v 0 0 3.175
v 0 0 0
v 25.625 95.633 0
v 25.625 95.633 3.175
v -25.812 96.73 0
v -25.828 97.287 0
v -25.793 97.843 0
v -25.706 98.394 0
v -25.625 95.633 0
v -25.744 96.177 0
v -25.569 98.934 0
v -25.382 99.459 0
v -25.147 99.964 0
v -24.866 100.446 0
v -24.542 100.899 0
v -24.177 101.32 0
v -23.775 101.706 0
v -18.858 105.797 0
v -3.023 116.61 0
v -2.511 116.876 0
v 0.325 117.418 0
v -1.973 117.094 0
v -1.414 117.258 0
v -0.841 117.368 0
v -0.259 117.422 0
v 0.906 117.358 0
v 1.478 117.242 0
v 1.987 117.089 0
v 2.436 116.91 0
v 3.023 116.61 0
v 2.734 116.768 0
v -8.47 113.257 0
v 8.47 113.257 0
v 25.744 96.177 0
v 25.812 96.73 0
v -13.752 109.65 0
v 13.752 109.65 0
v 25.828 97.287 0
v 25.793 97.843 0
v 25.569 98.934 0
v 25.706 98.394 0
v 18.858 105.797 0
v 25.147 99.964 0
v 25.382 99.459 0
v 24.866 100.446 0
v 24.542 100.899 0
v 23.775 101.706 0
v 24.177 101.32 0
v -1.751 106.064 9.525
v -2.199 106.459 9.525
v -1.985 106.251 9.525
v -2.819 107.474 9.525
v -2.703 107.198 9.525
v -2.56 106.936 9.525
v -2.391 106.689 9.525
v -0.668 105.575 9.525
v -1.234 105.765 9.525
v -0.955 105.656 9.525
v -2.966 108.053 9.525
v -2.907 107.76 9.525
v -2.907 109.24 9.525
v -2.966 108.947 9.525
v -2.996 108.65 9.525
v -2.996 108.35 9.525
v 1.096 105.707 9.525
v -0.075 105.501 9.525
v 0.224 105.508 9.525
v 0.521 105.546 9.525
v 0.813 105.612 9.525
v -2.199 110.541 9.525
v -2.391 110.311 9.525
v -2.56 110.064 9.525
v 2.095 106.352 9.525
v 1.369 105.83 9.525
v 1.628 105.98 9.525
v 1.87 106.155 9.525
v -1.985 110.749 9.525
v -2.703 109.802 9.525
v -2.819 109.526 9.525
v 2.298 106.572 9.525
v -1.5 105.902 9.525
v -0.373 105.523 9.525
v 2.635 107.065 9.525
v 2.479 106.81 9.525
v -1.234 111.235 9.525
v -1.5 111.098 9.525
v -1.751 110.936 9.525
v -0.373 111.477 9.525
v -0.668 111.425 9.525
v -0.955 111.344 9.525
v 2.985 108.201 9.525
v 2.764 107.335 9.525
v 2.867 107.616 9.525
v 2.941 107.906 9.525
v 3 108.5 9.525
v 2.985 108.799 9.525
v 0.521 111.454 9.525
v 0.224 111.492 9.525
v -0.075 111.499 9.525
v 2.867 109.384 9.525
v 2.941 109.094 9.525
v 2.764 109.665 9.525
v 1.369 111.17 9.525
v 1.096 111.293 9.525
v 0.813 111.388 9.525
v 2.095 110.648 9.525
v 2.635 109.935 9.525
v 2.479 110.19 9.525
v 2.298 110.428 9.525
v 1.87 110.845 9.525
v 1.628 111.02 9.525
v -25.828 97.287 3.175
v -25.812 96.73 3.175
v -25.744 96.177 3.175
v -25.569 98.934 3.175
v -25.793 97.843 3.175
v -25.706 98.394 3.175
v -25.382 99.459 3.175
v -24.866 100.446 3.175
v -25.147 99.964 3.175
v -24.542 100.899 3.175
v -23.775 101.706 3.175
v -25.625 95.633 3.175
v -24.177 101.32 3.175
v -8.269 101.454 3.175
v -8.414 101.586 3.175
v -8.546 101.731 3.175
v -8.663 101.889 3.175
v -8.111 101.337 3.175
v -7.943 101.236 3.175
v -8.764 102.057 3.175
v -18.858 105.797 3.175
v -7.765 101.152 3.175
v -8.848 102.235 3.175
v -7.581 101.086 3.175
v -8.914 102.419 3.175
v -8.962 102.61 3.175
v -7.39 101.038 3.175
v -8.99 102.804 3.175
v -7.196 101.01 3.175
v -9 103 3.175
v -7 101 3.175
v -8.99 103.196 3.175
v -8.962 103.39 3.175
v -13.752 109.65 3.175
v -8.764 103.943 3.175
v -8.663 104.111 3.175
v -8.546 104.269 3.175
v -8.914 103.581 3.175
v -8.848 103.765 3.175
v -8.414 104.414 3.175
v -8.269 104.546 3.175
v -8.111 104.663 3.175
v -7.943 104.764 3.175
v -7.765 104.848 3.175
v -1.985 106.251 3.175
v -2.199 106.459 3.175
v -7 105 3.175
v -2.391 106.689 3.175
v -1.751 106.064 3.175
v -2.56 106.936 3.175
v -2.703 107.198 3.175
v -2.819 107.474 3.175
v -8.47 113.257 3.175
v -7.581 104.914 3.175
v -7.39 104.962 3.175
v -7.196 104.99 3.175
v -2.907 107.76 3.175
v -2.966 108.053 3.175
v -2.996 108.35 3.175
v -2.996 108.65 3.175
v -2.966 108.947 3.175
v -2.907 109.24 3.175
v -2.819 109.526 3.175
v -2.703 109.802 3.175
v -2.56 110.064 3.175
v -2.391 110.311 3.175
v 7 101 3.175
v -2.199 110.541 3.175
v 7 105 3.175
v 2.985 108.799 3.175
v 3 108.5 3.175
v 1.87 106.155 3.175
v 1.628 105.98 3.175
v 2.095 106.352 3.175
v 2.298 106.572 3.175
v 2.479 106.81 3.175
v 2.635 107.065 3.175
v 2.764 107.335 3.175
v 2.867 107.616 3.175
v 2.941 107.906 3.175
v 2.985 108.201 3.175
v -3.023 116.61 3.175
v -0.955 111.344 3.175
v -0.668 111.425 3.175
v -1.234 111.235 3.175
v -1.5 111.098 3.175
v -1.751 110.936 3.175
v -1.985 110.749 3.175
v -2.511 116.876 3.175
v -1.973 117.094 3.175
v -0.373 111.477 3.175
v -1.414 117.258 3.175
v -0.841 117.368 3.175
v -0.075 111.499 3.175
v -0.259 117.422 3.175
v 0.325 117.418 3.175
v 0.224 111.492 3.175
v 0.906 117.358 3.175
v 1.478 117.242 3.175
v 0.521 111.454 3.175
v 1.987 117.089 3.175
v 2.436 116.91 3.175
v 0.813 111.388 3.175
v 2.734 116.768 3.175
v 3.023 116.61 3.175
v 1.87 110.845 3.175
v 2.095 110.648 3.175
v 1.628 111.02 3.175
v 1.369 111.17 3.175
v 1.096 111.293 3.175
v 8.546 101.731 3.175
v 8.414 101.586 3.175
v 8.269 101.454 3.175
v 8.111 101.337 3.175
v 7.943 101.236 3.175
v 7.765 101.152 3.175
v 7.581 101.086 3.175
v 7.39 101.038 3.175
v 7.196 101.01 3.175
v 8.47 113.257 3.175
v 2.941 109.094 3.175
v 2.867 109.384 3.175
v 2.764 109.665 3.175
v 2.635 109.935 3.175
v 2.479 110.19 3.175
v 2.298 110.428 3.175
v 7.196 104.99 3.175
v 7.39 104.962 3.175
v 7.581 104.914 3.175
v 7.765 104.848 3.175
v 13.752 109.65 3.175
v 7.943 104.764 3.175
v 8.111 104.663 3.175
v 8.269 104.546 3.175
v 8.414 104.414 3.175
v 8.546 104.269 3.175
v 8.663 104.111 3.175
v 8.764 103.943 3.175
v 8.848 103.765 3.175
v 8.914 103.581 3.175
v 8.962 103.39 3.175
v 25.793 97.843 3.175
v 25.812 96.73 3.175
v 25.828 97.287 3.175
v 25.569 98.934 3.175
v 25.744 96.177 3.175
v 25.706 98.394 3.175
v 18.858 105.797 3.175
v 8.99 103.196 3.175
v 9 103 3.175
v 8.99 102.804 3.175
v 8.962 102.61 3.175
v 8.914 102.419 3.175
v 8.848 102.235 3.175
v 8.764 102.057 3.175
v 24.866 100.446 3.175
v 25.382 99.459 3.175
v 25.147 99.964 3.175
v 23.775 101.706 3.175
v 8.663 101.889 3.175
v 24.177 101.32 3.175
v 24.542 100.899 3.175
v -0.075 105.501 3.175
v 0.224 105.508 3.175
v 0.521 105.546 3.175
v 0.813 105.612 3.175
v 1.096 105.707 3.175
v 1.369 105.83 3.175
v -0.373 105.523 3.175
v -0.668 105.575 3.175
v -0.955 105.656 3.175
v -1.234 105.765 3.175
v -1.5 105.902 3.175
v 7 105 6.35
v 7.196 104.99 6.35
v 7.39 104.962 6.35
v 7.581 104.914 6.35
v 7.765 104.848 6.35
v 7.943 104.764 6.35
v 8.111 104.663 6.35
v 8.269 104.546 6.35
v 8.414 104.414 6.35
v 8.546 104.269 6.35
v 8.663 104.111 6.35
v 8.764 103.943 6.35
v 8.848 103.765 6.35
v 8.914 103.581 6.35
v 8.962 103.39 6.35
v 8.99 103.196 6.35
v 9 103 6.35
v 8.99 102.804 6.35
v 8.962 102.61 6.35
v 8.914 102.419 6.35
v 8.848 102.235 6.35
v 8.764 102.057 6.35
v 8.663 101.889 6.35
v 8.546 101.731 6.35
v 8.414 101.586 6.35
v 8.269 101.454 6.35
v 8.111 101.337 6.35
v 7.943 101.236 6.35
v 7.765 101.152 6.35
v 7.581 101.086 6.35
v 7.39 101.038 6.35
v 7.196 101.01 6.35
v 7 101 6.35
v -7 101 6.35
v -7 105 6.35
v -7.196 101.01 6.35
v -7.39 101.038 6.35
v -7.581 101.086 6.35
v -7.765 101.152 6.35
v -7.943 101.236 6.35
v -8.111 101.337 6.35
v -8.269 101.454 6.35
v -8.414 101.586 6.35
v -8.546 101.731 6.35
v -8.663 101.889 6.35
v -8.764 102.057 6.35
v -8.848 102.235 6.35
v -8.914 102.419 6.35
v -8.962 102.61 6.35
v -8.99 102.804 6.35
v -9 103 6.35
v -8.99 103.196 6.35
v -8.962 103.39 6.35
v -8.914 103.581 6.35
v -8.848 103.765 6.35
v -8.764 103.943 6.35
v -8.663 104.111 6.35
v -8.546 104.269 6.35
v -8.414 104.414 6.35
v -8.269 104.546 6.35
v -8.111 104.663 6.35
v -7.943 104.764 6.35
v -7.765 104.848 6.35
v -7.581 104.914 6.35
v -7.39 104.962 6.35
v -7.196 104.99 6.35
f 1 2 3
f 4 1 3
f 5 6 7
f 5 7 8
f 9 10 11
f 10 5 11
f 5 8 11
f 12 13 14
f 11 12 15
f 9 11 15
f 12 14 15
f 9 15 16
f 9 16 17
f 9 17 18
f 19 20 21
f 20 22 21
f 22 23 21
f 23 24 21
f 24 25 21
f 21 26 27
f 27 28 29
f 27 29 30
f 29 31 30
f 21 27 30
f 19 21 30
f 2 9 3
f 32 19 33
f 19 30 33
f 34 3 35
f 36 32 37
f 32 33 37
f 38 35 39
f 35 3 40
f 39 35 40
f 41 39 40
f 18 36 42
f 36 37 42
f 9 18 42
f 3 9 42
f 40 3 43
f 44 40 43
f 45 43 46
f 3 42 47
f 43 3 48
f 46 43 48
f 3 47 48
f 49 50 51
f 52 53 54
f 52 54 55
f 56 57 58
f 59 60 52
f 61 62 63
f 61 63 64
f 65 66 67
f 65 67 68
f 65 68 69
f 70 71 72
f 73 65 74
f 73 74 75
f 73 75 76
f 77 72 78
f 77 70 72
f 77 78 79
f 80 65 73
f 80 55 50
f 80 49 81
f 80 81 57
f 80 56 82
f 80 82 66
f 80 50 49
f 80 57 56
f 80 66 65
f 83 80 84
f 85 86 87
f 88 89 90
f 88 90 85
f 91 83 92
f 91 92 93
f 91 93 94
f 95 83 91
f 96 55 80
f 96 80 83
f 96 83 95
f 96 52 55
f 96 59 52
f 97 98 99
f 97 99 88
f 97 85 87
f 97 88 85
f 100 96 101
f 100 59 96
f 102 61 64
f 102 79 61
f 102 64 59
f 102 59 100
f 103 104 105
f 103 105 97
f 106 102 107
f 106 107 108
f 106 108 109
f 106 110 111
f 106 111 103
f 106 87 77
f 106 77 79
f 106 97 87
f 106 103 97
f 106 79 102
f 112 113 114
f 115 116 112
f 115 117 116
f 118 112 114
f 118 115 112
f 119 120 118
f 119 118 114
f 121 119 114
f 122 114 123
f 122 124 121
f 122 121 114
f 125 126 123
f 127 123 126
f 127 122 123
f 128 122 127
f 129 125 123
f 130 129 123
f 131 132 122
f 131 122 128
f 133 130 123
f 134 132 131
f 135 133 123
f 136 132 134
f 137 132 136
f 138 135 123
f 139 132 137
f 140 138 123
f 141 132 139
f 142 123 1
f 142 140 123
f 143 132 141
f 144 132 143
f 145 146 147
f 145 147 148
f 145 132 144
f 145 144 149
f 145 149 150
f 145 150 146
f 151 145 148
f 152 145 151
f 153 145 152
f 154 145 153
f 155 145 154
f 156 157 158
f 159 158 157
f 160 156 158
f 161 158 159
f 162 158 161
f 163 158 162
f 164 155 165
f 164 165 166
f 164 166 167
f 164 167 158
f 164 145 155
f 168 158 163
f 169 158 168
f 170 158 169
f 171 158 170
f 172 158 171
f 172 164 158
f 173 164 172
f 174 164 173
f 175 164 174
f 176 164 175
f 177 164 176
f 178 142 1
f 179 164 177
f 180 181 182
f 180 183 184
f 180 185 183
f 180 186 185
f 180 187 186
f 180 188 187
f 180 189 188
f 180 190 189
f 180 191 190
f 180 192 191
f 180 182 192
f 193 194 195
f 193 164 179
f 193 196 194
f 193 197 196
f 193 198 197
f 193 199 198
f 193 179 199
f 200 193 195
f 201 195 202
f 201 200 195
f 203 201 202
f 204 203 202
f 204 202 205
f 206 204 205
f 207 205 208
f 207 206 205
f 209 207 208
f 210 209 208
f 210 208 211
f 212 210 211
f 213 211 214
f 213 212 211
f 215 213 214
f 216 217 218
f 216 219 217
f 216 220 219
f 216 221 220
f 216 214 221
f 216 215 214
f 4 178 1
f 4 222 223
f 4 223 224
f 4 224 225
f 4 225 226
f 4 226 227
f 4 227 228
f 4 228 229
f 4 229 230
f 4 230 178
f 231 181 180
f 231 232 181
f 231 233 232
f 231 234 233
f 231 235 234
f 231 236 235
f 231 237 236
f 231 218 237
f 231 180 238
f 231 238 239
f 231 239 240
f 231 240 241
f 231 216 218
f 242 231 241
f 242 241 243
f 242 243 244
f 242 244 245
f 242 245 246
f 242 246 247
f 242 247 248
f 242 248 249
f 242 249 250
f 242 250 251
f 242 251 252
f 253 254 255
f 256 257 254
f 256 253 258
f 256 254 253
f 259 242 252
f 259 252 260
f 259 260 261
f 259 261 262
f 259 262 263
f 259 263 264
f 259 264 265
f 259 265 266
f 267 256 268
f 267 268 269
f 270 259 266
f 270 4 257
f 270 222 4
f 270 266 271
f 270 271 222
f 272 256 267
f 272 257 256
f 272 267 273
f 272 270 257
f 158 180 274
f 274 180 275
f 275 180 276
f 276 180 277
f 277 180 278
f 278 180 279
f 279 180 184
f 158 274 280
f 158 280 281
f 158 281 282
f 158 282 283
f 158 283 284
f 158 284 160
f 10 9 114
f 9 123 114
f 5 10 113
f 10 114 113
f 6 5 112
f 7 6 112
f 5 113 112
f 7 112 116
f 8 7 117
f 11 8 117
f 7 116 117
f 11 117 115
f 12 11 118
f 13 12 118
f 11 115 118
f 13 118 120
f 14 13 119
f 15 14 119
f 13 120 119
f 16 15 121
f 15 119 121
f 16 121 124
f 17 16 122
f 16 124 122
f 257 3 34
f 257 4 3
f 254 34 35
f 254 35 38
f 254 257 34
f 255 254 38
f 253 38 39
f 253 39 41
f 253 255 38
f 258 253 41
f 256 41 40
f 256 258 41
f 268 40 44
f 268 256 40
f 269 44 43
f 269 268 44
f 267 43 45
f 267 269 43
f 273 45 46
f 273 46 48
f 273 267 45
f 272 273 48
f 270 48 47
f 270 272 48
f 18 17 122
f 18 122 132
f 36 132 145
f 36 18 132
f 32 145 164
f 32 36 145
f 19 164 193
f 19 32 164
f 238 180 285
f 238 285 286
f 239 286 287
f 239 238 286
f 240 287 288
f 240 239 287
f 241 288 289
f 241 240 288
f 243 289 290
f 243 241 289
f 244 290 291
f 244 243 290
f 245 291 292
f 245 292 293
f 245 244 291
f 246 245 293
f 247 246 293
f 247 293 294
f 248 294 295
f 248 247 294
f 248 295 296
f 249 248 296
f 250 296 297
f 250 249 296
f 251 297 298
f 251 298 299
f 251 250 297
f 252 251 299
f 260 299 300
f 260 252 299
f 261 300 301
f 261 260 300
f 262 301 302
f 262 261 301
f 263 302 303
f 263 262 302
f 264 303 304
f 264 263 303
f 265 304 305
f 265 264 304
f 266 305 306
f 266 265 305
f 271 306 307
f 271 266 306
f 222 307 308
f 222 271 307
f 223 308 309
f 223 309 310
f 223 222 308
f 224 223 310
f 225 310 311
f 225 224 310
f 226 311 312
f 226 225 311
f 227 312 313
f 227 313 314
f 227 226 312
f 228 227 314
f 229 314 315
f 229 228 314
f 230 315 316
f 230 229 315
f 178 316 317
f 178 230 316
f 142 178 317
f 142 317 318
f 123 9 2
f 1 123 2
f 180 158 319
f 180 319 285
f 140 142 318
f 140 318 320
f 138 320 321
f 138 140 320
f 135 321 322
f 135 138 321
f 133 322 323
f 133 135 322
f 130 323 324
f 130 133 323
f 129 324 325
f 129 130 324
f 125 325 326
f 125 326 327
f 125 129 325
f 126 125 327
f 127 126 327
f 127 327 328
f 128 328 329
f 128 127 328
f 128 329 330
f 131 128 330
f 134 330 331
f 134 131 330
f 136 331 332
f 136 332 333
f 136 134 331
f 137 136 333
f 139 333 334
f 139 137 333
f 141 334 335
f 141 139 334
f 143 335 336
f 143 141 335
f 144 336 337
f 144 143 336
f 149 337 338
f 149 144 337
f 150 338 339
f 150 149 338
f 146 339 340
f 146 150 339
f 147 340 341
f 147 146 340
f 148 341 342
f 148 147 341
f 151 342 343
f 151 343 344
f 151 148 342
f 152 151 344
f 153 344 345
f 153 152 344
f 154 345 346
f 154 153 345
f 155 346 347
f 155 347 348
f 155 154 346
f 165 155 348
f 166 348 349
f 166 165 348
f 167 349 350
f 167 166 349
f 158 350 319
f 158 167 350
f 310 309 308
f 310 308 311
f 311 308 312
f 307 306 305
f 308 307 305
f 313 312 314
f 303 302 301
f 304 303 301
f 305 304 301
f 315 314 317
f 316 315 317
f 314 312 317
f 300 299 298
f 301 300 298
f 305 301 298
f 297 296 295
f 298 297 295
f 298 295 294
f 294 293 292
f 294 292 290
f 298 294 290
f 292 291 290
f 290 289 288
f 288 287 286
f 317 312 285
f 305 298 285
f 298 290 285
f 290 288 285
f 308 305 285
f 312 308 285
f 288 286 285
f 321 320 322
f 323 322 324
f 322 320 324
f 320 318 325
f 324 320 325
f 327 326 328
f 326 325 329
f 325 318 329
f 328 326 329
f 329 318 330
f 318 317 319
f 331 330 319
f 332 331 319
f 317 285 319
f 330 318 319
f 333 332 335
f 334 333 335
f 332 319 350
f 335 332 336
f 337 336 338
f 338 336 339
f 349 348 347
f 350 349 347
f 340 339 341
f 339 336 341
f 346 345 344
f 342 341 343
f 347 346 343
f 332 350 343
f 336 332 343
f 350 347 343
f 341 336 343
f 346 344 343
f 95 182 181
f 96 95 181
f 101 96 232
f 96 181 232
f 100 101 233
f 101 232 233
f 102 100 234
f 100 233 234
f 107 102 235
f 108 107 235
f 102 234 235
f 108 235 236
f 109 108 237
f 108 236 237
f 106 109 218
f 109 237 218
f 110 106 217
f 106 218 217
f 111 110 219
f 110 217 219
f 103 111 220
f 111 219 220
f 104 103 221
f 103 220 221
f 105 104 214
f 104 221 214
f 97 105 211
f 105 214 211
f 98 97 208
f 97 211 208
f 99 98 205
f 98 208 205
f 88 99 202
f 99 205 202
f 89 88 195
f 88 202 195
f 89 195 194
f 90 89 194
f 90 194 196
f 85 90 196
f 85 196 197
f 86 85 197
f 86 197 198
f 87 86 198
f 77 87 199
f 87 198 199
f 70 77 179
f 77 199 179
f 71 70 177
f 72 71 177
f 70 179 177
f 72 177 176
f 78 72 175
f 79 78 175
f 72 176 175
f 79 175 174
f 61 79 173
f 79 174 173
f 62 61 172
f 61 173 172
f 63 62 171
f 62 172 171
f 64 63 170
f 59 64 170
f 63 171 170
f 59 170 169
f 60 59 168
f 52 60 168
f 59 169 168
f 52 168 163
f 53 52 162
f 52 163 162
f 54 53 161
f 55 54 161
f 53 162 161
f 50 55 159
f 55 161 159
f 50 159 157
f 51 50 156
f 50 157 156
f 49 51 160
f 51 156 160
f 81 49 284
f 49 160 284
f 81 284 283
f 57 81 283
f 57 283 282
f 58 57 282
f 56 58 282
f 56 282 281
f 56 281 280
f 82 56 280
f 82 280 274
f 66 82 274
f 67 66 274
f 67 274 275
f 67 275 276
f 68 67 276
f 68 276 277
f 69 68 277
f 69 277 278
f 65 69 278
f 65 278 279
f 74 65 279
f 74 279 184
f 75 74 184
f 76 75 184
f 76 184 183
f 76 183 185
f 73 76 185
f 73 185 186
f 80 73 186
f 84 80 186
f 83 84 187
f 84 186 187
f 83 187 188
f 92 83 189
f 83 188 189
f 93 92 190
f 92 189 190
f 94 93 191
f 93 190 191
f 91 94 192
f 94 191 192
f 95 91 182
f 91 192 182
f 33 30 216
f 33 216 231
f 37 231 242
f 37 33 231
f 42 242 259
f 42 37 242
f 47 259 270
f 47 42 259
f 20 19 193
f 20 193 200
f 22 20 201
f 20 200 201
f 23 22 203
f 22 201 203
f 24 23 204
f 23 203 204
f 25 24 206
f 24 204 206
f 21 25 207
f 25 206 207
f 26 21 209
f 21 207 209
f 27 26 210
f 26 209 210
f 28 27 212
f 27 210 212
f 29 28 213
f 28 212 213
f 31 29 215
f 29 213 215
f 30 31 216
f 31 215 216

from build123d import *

# Parameters (mm, degrees)
BOSS_EXTRUDE1_DEPTH = 3.175
CUT_EXTRUDE2_START  = -3.175
CUT_EXTRUDE2_DEPTH  = 3.175
FILLET1_R           = 6
BOSS_EXTRUDE2_DEPTH = 3.175
SKETCH2_R           = 3
BOSS_EXTRUDE3_DEPTH = 6.35


with BuildPart() as part:
    # Sketch1 → Boss-Extrude1 (new body)
    with BuildSketch(Plane.XY):
        with BuildLine():
            Line((-32.352380638, 120.740728286), (0, 0))
            Line((0, 0), (0, 125))
            ThreePointArc((0, 125), (-16.315774028, 123.930607672), (-32.352380638, 120.740728286))
        make_face()
        with BuildLine():
            Line((0, 125), (0, 0))
            Line((0, 0), (32.352380638, 120.740728286))
            ThreePointArc((32.352380638, 120.740728286), (16.315774028, 123.930607672), (0, 125))
        make_face()
    extrude(amount=BOSS_EXTRUDE1_DEPTH)

    # Sketch3 → Cut-Extrude2 (cut)
    with BuildSketch(Plane.XY.offset(3.175).offset(CUT_EXTRUDE2_START)):
        with BuildLine():
            ThreePointArc((-12.5, 124.373429638), (-199.821294039, -6.943966706), (0, -118.321595662))
            ThreePointArc((0, -118.321595662), (-69.003341725, -16.373894052), (-26.577702514, 99.189336132))
            Line((-26.577702514, 99.189336132), (-32.352380638, 120.740728286))
            ThreePointArc((-32.352380638, 120.740728286), (-22.499625375, 122.958394825), (-12.5, 124.373429638))
        make_face()
        with BuildLine():
            ThreePointArc((-26.577702514, 99.189336132), (-13.871129508, 109.564341508), (0, 118.321595662))
            ThreePointArc((0, 118.321595662), (-6.172126729, 121.50835908), (-12.5, 124.373429638))
            ThreePointArc((-12.5, 124.373429638), (-22.499625375, 122.958394825), (-32.352380638, 120.740728286))
            Line((-32.352380638, 120.740728286), (-26.577702514, 99.189336132))
        make_face()
        with BuildLine():
            ThreePointArc((-12.5, 124.373429638), (-6.172126729, 121.50835908), (0, 118.321595662))
            ThreePointArc((0, 118.321595662), (6.172126729, 121.50835908), (12.5, 124.373429638))
            ThreePointArc((12.5, 124.373429638), (0, 125), (-12.5, 124.373429638))
        make_face()
        with BuildLine():
            ThreePointArc((26.577702514, 99.189336132), (58.668892288, 54.138757654), (70, 0))
            ThreePointArc((70, 0), (51.189500386, -68.738635424), (0, -118.321595662))
            ThreePointArc((0, -118.321595662), (133.738635424, -116.189500386), (200, 0))
            ThreePointArc((200, 0), (139.624057783, 112.5), (12.5, 124.373429638))
            ThreePointArc((12.5, 124.373429638), (22.499625375, 122.958394825), (32.352380638, 120.740728286))
            Line((32.352380638, 120.740728286), (26.577702514, 99.189336132))
        make_face()
        with BuildLine():
            ThreePointArc((0, 118.321595662), (13.871129508, 109.564341508), (26.577702514, 99.189336132))
            Line((26.577702514, 99.189336132), (32.352380638, 120.740728286))
            ThreePointArc((32.352380638, 120.740728286), (22.499625375, 122.958394825), (12.5, 124.373429638))
            ThreePointArc((12.5, 124.373429638), (6.172126729, 121.50835908), (0, 118.321595662))
        make_face()
    extrude(amount=CUT_EXTRUDE2_DEPTH, mode=Mode.SUBTRACT)

    # Fillet1
    fillet1_edges = [part.edges().sort_by_distance(p)[0] for p in [
        (0, 118.321595662, 1.5875),
        (-26.577702514, 99.189336132, 1.5875),
        (26.577702514, 99.189336132, 1.5875),
    ]]
    fillet(fillet1_edges, radius=FILLET1_R)

    # Sketch4 → Boss-Extrude2 (add)
    with BuildSketch(Plane.XY.offset(3.175)):
        with BuildLine():
            Line((7, 101), (-7, 101))
            ThreePointArc((-7, 101), (-9, 103), (-7, 105))
            Line((-7, 105), (7, 105))
            ThreePointArc((7, 105), (9, 103), (7, 101))
        make_face()
    extrude(amount=BOSS_EXTRUDE2_DEPTH)

    # Sketch2 → Boss-Extrude3 (add)
    with BuildSketch(Plane.XY.offset(3.175)):
        with Locations((0, 108.5)):
            Circle(SKETCH2_R)
    extrude(amount=BOSS_EXTRUDE3_DEPTH)


solid = part.part
